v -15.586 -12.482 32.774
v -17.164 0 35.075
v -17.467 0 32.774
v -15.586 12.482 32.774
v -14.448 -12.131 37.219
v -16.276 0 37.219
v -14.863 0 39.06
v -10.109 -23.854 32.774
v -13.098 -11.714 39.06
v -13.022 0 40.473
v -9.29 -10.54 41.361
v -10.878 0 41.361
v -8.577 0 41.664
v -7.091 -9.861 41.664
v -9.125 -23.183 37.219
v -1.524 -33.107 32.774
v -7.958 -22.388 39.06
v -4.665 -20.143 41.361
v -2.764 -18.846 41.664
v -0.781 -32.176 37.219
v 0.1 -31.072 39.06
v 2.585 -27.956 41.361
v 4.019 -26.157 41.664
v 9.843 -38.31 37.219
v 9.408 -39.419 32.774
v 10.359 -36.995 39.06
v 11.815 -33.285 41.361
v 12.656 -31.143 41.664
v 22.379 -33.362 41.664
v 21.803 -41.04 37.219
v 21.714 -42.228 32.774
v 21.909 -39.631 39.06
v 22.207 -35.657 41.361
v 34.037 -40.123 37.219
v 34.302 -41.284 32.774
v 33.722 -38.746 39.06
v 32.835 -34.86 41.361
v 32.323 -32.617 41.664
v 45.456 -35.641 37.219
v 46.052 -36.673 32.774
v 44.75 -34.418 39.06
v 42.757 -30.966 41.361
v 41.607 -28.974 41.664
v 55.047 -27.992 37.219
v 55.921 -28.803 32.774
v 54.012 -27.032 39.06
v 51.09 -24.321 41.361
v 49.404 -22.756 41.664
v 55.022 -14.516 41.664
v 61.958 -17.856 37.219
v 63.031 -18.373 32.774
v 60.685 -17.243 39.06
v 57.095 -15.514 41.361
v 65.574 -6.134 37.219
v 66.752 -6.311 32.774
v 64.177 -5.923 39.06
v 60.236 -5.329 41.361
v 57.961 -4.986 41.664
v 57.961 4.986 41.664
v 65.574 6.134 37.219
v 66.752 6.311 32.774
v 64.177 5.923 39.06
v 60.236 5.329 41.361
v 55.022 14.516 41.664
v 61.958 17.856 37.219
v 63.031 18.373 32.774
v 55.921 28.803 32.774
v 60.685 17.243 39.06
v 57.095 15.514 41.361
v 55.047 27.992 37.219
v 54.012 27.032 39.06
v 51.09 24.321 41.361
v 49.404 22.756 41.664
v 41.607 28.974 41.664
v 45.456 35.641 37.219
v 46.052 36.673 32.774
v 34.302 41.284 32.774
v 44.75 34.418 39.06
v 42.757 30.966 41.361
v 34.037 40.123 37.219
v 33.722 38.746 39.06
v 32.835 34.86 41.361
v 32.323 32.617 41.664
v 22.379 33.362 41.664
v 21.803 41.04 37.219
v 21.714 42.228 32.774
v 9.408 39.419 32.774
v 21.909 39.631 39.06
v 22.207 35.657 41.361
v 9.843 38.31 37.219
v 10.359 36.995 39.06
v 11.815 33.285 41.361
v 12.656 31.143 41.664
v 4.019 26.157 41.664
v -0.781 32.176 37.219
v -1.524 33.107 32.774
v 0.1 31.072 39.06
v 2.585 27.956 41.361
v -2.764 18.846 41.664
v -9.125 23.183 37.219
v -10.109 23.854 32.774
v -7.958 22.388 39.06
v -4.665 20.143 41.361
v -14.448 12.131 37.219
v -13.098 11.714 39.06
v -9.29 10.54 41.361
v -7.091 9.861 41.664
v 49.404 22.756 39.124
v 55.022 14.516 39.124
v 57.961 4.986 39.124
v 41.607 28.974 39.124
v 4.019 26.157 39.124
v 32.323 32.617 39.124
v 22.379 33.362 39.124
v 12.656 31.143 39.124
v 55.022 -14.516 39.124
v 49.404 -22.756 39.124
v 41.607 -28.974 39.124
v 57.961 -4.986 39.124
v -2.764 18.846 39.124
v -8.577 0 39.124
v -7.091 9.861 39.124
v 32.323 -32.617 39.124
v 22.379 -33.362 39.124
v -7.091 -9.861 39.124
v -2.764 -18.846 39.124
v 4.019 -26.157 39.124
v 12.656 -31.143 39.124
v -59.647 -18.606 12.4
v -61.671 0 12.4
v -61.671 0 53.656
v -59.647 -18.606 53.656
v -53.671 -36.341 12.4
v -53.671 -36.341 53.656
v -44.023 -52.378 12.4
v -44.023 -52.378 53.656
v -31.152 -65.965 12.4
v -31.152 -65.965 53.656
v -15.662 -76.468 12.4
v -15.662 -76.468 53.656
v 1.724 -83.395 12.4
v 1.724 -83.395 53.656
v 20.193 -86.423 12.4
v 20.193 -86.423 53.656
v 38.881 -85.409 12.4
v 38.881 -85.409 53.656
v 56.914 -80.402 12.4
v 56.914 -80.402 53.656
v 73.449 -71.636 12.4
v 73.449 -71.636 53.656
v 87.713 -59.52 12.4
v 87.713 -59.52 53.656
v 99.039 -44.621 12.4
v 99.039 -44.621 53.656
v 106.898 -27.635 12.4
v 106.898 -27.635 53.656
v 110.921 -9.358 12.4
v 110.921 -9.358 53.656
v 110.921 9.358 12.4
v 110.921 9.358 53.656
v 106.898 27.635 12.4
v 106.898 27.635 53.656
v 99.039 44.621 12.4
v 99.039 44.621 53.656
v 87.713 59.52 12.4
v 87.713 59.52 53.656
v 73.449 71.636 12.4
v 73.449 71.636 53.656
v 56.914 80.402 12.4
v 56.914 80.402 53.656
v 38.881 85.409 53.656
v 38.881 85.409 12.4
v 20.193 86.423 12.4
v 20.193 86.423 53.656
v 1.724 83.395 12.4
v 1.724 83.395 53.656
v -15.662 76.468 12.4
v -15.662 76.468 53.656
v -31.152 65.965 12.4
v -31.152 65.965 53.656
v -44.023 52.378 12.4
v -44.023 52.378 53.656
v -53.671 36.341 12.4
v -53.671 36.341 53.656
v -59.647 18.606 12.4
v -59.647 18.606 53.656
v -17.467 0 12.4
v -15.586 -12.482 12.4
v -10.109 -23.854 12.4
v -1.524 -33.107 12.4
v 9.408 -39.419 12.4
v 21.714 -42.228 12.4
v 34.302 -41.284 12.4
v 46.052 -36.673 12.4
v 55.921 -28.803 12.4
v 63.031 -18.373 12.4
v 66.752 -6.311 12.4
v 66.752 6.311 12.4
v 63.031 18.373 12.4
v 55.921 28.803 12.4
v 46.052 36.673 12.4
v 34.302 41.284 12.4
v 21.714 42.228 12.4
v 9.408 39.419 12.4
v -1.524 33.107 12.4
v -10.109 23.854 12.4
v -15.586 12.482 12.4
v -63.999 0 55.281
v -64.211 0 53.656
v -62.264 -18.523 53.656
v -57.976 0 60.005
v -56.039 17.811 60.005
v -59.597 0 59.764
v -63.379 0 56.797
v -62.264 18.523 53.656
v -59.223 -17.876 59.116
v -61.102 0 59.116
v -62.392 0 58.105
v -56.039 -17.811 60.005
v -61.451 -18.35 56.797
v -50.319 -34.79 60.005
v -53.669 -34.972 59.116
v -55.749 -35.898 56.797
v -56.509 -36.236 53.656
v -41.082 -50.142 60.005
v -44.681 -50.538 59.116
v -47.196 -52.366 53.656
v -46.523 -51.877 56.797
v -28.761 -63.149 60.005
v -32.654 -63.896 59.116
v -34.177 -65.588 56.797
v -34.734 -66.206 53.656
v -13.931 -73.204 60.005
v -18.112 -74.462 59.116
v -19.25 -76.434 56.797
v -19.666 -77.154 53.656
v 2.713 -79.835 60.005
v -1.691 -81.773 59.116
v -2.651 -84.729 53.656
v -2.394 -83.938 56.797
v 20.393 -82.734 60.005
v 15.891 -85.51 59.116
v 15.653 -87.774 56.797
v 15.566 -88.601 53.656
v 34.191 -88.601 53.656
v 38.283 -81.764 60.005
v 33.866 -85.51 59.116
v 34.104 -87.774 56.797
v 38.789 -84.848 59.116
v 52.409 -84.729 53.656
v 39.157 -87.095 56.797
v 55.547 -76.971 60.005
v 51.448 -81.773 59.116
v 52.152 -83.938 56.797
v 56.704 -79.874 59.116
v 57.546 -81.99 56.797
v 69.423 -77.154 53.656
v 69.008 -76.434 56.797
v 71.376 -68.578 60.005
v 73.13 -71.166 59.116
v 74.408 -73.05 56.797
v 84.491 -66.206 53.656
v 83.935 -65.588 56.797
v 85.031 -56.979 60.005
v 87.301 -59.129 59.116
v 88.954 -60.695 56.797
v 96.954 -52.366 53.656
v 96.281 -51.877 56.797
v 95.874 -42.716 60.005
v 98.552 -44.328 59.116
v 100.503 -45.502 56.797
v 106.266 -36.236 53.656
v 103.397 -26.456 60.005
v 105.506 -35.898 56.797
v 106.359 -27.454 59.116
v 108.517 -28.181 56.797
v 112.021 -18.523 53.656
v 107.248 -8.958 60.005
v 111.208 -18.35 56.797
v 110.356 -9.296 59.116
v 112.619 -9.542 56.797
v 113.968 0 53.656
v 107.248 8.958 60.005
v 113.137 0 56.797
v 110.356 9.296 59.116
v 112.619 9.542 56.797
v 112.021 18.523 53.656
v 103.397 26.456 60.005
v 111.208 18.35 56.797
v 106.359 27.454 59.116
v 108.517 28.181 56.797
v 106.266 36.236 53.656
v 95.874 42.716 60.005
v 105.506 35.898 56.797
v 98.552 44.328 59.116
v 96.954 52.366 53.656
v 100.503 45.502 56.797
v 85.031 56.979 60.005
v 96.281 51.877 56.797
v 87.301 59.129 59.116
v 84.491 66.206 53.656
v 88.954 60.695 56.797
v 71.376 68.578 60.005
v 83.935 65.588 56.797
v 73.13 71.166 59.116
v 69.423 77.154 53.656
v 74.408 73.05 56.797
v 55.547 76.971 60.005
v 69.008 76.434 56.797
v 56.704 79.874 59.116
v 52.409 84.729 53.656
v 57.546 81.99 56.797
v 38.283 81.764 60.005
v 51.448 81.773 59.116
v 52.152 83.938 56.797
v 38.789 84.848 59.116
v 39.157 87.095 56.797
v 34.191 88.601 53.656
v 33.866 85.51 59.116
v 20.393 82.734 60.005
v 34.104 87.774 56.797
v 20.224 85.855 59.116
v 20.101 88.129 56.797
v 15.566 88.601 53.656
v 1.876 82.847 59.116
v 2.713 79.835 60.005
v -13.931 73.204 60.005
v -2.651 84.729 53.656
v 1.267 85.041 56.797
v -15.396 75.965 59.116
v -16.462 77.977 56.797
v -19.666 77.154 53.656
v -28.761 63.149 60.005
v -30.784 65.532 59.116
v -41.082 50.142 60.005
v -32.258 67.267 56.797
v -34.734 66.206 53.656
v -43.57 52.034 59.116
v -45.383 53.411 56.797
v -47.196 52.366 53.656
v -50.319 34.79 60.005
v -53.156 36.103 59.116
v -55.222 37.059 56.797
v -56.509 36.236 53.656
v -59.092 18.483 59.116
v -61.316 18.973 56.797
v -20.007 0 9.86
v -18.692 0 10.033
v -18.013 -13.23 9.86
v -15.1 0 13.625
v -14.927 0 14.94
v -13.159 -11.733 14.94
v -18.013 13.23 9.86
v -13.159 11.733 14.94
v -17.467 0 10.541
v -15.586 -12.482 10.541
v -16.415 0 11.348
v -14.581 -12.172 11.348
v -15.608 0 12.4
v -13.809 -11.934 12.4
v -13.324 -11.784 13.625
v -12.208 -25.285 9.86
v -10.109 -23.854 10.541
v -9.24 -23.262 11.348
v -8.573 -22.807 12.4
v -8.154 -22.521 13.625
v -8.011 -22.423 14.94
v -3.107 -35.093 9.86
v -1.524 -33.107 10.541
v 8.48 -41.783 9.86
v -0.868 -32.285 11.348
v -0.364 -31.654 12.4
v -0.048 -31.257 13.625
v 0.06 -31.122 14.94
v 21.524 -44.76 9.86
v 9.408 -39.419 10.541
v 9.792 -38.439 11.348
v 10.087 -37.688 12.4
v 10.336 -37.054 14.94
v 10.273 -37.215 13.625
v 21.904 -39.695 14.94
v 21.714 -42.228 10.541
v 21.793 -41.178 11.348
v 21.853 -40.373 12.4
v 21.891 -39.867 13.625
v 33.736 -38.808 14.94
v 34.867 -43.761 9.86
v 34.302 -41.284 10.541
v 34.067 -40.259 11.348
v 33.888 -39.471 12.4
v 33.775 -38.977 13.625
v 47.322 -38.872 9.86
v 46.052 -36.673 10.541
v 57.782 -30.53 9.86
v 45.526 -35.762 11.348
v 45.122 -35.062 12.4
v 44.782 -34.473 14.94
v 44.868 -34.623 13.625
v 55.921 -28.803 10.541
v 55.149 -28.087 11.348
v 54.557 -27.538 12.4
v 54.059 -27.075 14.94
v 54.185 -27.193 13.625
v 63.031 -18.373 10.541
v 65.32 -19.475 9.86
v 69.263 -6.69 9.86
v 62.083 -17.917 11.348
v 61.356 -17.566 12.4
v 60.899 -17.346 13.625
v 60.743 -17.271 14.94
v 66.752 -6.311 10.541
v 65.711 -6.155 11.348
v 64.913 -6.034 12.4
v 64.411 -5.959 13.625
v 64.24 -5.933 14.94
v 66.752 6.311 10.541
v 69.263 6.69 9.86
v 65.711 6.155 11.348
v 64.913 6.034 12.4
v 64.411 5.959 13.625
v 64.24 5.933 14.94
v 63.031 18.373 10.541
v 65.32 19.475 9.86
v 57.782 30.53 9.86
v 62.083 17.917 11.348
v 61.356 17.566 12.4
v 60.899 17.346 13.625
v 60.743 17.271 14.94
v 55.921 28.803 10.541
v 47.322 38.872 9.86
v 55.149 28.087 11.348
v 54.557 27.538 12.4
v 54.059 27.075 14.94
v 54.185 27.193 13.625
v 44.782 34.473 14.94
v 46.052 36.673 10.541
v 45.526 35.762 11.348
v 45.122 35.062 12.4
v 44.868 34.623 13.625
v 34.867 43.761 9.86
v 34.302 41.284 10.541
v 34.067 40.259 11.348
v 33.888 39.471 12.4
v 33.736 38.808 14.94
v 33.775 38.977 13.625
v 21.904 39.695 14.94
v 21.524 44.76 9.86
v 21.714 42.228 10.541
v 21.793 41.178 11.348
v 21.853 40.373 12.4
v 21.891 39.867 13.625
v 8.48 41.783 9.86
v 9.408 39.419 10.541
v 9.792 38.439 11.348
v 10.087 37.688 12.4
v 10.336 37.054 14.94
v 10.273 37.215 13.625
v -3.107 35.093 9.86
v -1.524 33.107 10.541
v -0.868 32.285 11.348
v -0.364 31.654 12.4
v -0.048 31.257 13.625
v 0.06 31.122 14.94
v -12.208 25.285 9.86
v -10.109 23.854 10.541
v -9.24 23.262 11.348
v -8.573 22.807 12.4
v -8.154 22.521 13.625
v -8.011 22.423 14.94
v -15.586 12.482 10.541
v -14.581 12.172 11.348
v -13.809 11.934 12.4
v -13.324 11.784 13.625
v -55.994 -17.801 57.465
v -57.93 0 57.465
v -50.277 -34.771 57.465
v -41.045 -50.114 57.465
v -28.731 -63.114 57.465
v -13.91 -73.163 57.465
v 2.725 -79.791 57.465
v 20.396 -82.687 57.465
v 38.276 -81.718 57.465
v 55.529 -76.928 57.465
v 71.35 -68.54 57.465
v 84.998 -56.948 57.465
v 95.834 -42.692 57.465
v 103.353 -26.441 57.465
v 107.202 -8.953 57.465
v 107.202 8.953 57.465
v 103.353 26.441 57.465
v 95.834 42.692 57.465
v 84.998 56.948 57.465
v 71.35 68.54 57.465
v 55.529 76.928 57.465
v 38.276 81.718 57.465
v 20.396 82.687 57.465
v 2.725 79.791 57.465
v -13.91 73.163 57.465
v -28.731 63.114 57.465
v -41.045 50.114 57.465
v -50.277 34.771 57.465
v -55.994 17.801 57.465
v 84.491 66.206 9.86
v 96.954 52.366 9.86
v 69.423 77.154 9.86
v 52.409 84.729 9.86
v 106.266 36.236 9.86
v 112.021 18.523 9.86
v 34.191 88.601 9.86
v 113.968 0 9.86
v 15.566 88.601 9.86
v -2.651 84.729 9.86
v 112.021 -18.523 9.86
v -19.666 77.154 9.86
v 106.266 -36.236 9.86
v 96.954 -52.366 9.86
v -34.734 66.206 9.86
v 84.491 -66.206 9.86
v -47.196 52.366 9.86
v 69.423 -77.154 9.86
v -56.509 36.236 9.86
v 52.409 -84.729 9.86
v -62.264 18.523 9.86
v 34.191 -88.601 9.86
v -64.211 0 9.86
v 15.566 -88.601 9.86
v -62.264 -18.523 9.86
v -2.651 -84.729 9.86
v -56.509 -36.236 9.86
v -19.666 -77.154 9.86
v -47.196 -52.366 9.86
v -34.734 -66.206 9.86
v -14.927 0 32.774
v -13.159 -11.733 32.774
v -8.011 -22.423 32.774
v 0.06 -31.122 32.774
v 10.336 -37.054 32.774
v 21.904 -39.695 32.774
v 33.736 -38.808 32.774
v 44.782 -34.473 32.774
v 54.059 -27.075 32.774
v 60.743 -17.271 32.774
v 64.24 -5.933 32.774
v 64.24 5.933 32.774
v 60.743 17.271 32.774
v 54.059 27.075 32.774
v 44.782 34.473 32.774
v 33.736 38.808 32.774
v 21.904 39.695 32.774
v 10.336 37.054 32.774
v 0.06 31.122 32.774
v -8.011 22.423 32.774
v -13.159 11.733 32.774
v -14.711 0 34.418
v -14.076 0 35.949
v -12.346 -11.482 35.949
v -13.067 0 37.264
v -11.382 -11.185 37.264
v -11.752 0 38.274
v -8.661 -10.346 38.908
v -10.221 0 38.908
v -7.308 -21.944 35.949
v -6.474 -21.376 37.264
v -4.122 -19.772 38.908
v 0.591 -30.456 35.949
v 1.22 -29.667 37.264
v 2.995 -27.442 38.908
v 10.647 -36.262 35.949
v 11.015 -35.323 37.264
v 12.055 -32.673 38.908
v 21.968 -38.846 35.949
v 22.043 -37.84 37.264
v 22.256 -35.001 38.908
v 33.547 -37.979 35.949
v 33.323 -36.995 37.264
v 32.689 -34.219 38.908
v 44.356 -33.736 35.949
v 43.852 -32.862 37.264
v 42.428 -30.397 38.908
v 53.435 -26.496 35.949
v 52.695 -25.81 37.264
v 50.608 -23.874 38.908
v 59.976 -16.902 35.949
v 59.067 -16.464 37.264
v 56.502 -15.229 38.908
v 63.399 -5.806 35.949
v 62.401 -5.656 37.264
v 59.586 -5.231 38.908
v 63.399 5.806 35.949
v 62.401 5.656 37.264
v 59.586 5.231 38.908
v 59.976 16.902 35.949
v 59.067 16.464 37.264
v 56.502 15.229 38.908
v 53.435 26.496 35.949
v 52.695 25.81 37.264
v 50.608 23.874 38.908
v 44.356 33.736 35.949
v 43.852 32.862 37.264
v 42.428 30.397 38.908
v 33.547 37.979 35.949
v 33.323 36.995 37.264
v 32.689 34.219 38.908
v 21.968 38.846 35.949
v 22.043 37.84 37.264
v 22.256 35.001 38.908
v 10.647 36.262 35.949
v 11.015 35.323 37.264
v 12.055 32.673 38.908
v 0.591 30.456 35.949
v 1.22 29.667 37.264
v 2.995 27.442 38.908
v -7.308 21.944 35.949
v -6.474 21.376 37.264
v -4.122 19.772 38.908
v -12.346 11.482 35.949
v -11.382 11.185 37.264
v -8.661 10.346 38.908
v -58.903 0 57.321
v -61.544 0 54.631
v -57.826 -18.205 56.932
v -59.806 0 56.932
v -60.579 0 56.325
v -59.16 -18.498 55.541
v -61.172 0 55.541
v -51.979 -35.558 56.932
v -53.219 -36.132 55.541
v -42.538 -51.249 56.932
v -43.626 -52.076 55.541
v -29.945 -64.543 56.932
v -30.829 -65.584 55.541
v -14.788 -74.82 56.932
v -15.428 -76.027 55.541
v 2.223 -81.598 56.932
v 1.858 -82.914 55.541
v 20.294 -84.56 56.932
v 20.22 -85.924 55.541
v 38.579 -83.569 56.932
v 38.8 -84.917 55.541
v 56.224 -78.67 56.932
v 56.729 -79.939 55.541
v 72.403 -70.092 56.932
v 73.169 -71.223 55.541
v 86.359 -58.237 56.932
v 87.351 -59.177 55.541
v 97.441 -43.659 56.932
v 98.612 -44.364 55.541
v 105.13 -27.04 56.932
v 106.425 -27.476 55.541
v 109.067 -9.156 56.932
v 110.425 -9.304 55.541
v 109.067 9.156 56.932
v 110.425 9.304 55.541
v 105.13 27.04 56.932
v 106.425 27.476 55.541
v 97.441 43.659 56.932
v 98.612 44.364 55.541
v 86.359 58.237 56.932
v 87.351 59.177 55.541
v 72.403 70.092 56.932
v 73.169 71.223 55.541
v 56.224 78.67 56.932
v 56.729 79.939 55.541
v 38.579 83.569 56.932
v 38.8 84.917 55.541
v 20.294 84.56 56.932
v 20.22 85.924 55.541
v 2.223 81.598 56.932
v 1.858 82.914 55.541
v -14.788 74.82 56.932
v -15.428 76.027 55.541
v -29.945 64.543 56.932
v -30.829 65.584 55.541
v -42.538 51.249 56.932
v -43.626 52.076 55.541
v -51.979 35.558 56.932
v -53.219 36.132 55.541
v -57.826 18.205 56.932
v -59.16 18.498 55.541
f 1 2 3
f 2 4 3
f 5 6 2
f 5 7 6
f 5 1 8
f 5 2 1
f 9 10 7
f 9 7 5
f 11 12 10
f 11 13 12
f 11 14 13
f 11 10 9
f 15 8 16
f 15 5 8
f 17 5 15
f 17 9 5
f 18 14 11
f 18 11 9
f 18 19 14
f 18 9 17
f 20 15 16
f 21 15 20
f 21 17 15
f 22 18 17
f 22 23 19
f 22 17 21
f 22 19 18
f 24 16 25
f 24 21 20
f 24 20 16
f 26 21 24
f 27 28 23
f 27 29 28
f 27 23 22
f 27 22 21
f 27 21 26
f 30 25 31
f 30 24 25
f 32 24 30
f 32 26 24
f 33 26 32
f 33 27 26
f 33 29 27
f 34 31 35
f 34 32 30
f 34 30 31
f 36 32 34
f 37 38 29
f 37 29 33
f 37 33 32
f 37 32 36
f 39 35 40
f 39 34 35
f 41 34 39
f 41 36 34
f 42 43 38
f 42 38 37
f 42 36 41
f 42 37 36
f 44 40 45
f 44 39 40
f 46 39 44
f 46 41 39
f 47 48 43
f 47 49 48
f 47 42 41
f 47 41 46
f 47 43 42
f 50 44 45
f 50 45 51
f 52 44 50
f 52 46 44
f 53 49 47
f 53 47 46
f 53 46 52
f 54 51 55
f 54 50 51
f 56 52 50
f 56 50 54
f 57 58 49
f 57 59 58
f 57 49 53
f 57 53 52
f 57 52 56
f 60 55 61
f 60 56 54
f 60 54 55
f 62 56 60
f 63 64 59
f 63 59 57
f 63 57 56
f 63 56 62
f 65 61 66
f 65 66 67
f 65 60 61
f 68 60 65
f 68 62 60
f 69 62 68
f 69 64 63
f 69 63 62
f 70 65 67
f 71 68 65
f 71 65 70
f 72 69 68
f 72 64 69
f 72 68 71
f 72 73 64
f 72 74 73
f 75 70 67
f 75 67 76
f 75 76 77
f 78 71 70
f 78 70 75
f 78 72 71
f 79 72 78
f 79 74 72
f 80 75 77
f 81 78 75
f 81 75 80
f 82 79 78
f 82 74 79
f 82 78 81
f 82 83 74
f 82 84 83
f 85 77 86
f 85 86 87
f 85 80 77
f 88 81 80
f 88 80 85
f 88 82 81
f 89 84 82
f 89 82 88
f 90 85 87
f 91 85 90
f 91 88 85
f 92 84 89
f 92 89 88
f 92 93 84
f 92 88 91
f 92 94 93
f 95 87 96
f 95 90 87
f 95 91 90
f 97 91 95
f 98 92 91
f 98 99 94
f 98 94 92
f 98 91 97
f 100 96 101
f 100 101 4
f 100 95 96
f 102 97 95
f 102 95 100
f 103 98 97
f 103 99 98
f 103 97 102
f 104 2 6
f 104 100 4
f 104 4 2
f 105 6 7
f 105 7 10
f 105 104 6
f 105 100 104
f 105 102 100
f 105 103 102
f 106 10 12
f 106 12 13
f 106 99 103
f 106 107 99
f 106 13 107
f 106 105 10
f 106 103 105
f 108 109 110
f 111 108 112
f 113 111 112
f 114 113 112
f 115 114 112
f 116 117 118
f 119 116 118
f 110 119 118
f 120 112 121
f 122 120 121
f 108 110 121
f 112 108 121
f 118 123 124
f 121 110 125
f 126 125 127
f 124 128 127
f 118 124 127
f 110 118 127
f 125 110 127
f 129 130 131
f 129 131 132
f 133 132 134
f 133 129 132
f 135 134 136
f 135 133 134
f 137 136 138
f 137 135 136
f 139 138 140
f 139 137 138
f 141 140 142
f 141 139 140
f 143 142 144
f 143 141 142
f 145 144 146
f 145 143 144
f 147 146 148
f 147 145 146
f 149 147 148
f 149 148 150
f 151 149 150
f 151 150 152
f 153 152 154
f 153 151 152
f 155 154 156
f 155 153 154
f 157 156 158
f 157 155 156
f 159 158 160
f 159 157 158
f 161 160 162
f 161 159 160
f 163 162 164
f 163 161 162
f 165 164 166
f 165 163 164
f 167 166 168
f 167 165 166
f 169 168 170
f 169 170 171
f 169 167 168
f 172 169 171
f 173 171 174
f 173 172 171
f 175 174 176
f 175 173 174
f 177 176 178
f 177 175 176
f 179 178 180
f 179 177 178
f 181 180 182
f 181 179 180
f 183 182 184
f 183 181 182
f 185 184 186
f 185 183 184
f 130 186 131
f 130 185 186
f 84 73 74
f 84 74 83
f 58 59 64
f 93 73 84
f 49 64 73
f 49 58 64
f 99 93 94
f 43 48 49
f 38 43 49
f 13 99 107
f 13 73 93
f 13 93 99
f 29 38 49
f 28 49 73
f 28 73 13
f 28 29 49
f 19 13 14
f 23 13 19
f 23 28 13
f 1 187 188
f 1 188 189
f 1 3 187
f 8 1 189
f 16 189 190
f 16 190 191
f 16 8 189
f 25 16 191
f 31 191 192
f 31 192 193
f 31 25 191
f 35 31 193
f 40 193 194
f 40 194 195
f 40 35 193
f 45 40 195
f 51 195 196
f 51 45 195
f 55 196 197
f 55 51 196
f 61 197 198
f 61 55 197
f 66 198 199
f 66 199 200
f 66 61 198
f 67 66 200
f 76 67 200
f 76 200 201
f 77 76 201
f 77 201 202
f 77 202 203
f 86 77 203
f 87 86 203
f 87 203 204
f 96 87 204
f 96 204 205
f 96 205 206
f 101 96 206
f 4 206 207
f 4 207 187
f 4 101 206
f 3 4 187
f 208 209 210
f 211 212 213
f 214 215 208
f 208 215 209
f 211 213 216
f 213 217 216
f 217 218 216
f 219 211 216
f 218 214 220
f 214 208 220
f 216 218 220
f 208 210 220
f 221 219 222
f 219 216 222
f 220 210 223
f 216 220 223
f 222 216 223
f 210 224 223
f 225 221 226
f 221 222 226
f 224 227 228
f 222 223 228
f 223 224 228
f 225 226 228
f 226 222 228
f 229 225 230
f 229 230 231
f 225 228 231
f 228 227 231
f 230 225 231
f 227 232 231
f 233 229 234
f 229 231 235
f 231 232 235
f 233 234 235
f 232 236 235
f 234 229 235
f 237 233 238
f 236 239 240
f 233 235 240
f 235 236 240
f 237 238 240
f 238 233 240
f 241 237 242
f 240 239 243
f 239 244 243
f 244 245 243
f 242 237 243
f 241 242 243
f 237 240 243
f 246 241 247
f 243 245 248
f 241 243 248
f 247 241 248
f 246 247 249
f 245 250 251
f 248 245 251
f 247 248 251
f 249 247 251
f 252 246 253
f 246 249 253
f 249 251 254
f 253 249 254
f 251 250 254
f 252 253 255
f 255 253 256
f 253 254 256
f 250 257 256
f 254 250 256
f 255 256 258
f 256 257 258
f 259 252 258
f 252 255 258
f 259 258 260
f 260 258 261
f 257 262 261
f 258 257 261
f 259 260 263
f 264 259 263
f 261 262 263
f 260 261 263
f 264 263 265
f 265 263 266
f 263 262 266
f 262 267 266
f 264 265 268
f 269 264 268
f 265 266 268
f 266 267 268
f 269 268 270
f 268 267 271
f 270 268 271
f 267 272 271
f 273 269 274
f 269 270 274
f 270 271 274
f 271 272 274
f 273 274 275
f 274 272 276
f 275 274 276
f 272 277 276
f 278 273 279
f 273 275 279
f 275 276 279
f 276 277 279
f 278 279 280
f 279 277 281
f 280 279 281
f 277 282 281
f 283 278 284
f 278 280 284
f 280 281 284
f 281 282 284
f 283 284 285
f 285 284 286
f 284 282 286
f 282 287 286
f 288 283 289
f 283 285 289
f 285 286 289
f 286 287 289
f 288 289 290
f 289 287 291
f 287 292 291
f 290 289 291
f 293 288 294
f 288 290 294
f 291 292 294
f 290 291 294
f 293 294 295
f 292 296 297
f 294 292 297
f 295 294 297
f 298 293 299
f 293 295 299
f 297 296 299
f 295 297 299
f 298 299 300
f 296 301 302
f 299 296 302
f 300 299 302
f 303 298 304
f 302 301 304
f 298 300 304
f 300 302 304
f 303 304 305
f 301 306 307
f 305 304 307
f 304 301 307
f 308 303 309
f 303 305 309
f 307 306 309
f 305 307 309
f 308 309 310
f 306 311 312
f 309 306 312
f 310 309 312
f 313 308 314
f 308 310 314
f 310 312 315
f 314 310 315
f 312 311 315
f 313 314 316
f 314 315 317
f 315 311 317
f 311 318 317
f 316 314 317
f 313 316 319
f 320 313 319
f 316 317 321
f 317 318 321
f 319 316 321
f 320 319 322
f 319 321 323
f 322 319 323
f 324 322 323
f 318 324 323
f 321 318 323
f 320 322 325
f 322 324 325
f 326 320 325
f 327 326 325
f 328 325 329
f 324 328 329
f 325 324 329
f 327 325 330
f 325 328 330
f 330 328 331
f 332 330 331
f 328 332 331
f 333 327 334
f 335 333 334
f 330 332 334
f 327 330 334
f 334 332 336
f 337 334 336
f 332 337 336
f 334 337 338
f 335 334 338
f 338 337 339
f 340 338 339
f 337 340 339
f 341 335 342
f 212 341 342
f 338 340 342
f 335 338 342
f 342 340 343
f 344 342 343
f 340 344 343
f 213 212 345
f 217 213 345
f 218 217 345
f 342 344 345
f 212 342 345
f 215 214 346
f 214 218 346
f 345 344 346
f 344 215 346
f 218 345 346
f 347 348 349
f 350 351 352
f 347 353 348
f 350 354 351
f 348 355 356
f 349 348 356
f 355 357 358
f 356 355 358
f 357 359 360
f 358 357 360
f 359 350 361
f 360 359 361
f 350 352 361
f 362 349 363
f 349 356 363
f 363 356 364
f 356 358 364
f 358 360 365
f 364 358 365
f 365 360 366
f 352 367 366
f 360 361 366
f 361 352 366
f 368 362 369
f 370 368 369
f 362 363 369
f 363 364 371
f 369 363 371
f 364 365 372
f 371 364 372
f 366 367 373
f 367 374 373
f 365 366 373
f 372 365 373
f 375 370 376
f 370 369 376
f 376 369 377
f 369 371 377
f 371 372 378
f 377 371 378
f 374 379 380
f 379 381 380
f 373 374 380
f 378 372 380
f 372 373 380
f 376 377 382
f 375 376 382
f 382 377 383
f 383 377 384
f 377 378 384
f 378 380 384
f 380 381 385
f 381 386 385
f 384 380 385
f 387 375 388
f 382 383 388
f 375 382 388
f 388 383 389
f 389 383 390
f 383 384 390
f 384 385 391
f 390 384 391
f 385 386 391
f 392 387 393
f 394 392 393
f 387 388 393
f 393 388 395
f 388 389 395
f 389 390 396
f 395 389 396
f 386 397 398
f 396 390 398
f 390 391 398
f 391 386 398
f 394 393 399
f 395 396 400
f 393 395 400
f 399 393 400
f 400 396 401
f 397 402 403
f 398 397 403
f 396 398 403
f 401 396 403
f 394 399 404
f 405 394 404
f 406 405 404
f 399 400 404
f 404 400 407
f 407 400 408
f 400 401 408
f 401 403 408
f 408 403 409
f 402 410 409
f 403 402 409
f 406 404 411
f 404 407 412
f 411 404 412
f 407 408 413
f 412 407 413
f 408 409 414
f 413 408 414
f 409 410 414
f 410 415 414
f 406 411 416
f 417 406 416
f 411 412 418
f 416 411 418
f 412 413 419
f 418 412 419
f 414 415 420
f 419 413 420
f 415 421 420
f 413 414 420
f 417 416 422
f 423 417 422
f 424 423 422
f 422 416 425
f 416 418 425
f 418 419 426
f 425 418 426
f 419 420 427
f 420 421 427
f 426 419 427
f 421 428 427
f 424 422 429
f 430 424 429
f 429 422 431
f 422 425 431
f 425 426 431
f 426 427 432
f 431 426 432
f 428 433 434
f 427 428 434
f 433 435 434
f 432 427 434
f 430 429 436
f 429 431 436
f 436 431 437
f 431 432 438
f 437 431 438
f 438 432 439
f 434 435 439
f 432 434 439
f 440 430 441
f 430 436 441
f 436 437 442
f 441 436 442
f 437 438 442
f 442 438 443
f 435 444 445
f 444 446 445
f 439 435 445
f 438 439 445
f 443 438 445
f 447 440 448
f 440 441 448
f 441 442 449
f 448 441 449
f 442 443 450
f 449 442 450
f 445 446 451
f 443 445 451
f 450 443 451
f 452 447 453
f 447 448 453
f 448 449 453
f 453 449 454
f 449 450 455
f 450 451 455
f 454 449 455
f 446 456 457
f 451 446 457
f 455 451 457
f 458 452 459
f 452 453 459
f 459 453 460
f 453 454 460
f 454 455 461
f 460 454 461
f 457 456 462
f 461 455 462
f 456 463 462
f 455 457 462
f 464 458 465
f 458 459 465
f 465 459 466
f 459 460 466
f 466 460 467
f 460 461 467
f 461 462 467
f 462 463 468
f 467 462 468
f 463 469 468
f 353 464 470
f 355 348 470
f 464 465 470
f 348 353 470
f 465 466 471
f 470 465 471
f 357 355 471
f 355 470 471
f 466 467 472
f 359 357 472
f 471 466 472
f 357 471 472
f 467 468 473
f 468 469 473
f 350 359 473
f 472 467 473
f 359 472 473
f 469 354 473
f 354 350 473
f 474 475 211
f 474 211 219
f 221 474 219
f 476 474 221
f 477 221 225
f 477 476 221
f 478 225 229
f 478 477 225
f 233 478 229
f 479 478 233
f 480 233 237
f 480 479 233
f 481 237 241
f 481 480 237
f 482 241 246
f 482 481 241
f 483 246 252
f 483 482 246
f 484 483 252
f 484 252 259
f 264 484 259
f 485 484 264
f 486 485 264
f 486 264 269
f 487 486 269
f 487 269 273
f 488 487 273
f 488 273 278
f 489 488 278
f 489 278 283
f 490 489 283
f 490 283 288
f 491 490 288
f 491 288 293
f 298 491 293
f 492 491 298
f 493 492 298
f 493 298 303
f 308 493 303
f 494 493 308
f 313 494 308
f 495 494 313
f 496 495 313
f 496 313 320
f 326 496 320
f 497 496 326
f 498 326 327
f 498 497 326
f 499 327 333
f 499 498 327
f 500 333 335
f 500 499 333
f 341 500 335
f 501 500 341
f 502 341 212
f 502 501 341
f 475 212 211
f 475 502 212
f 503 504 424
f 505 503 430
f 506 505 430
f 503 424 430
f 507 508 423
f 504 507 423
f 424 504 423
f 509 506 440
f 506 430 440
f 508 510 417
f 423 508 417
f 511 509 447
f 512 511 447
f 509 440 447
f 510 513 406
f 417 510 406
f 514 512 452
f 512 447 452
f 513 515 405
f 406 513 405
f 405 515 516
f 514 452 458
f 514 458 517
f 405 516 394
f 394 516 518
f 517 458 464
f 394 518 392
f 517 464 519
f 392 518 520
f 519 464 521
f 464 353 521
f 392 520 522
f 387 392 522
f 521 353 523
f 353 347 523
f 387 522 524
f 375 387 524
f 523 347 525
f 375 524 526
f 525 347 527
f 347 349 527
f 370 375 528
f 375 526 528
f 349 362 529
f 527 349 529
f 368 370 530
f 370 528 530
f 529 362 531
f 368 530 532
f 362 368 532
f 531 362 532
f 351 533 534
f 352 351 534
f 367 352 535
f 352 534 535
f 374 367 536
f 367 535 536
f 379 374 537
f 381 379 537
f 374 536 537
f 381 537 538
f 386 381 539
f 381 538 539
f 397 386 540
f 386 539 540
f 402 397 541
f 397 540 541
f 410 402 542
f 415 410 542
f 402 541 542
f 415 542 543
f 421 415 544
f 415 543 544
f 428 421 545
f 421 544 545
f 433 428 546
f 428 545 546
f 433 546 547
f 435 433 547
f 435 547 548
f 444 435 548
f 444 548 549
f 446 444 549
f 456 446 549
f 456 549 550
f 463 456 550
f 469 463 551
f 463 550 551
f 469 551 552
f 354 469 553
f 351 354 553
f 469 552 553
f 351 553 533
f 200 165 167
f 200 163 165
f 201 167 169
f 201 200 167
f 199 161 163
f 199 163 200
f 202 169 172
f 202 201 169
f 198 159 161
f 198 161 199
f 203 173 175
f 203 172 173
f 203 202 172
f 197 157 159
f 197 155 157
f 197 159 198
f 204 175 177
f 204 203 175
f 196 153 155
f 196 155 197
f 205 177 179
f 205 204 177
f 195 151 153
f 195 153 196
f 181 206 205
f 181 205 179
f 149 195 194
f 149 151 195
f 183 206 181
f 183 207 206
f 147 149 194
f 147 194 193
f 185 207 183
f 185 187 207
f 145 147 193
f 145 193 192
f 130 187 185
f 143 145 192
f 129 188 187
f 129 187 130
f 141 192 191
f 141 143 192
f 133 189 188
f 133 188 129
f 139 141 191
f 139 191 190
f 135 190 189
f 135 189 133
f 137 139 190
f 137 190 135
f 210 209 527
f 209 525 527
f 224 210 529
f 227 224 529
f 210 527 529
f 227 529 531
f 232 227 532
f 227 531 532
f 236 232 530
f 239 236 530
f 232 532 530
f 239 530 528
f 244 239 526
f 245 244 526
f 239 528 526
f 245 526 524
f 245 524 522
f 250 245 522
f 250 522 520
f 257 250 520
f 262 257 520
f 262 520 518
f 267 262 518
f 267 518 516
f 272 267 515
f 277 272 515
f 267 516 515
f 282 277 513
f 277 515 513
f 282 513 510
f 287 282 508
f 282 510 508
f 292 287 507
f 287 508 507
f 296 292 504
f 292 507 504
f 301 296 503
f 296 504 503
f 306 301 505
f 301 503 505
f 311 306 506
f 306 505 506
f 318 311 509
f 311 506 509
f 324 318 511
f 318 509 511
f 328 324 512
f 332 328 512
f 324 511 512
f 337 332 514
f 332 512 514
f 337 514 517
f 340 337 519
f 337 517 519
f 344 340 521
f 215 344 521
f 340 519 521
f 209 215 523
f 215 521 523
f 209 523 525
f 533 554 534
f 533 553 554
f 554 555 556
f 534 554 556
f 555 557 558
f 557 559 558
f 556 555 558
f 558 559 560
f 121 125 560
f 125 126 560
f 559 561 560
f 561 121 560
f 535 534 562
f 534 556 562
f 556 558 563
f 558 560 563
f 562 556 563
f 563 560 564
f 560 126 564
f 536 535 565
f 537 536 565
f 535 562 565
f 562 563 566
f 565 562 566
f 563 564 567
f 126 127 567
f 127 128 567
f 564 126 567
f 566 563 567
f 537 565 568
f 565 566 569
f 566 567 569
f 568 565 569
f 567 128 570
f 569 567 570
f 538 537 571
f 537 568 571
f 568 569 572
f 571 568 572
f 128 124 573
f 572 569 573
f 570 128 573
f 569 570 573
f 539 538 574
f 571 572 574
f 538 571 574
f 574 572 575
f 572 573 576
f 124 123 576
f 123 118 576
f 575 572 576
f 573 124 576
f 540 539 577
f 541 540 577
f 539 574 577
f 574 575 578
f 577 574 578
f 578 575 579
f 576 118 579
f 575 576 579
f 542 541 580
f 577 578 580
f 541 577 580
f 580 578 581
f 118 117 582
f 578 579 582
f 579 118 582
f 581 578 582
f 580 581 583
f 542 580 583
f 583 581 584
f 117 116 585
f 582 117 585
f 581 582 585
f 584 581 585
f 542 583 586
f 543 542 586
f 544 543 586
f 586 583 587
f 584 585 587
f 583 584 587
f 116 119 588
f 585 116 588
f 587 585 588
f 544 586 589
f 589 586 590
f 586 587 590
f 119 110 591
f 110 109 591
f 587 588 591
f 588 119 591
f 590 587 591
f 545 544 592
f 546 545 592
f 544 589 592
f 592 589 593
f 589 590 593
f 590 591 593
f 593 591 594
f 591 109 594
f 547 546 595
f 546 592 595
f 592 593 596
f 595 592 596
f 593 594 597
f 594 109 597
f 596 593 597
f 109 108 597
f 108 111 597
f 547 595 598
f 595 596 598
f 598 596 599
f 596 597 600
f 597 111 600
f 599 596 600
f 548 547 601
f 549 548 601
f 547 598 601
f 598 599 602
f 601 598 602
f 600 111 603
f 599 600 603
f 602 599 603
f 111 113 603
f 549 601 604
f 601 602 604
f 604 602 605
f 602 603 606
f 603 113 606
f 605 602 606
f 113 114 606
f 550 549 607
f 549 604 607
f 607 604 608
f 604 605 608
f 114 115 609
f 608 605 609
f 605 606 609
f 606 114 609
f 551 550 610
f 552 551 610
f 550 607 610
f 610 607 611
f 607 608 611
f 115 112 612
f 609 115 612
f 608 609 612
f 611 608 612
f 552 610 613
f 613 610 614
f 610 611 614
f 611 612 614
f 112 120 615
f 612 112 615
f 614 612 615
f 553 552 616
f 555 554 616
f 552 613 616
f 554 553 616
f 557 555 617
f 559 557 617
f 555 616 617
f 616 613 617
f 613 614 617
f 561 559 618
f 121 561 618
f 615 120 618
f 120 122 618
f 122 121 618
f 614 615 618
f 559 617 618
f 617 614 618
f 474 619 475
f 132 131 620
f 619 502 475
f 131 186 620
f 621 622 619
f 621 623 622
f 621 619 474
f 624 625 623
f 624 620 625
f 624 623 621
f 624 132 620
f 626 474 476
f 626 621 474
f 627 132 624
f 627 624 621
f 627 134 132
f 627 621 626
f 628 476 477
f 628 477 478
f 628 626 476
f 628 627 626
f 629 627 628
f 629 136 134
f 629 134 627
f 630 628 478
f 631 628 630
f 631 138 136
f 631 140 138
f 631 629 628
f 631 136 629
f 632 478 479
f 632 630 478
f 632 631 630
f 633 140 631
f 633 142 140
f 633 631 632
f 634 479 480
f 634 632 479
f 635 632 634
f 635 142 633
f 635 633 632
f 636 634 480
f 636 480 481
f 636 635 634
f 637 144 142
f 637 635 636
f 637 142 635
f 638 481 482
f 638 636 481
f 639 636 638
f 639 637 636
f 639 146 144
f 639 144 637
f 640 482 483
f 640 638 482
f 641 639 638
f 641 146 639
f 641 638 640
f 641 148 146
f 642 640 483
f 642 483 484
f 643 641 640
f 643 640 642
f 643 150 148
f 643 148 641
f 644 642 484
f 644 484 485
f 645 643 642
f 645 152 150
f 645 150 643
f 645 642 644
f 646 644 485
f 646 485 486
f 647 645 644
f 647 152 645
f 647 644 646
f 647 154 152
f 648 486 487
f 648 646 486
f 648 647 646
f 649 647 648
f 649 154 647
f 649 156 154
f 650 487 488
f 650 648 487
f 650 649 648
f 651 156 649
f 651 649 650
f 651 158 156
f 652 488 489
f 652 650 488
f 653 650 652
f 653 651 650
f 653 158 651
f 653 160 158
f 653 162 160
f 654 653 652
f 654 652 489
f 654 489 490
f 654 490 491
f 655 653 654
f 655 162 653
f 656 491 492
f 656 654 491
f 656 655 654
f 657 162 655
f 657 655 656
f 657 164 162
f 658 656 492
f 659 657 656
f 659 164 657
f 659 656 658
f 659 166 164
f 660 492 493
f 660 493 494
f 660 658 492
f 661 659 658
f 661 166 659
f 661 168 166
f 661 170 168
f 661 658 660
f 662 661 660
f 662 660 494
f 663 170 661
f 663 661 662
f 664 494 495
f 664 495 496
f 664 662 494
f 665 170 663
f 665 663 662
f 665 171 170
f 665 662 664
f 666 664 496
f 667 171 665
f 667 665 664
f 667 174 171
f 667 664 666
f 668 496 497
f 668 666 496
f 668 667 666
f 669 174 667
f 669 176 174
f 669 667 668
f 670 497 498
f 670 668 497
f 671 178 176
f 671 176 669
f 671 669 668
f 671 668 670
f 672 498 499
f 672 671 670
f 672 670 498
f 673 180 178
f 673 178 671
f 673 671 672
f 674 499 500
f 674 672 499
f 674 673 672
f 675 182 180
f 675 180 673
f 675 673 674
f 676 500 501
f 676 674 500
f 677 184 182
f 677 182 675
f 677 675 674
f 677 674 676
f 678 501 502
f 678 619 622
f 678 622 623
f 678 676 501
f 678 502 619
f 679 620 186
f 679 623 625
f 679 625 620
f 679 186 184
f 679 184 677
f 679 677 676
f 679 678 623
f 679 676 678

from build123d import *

# Parameters (mm, degrees)
F2_T = 2.54
F3_R = 5.08


# Not quite as in the source:
# - a shell that OpenCascade refuses in one call is made with other operations: the cavity is built on its own and cut out


with BuildPart() as f1:
    # F0 (on Front) → F1 (revolve)
    with BuildSketch(Plane.XZ):
        with BuildLine():
            ThreePointArc((-57.9764892951, 60.004751325), (-62.3916472883, 58.1048437598), (-64.2108023167, 53.6558052296))
            Line((-64.2108023167, 53.6558052296), (-64.2108023167, 9.8601095378))
            Line((-64.2108023167, 9.8601095378), (-14.9272382259, 9.8601095378))
            Line((-14.9272382259, 9.8601095378), (-14.9272382259, 32.7742578626))
            ThreePointArc((-14.9272382259, 32.7742578626), (-13.0673662865, 37.2643859231), (-8.5772382259, 39.1242578626))
            Line((-8.5772382259, 39.1242578626), (24.8787216842, 39.1242578626))
            Line((24.8787216842, 39.1242578626), (24.8787216842, 61.514493078))
            Line((24.8787216842, 61.514493078), (-57.9764892951, 60.004751325))
        make_face()
    revolve(axis=Axis((24.8787216842, 0, 50.3193754703), (0, 0, 1)))

    # F2: shell of thickness 2.54, made by hand


with BuildPart() as f2_core1:
    # F2_t2: copy of F1
    add(f1.part)

    # the walls: a layer under each face that stays
    f2_faces = [f2_core1.faces().sort_by_distance(p)[0] for p in [
        (112.1490906567, 0, 58.1048437598),
        (113.9682456851, 0, 31.7579573837),
        (84.2717376848, 59.3930160006, 9.8601095378),
        (64.6846815944, 0, 21.3171837002),
        (62.8248096549, 0, 37.2643859231),
        (24.8787216842, 0, 39.1242578626),
    ]]
    thicken(f2_faces, amount=-F2_T, mode=Mode.SUBTRACT)


with BuildPart() as f1_1:
    add(f1.part)

    # what is left inside the walls is the cavity
    f2_cavity = [f2_core1.part.solids().sort_by_distance(p)[0] for p in [
        (111.402846, 0, 39.903907),
    ]]
    add(f2_cavity, mode=Mode.SUBTRACT)

    # F3
    f3_edges = [f1_1.edges().sort_by_distance(p)[0] for p in [
        (64.684682, 0, 9.86011),
    ]]
    fillet(f3_edges, radius=F3_R)


solid = f1_1.part
